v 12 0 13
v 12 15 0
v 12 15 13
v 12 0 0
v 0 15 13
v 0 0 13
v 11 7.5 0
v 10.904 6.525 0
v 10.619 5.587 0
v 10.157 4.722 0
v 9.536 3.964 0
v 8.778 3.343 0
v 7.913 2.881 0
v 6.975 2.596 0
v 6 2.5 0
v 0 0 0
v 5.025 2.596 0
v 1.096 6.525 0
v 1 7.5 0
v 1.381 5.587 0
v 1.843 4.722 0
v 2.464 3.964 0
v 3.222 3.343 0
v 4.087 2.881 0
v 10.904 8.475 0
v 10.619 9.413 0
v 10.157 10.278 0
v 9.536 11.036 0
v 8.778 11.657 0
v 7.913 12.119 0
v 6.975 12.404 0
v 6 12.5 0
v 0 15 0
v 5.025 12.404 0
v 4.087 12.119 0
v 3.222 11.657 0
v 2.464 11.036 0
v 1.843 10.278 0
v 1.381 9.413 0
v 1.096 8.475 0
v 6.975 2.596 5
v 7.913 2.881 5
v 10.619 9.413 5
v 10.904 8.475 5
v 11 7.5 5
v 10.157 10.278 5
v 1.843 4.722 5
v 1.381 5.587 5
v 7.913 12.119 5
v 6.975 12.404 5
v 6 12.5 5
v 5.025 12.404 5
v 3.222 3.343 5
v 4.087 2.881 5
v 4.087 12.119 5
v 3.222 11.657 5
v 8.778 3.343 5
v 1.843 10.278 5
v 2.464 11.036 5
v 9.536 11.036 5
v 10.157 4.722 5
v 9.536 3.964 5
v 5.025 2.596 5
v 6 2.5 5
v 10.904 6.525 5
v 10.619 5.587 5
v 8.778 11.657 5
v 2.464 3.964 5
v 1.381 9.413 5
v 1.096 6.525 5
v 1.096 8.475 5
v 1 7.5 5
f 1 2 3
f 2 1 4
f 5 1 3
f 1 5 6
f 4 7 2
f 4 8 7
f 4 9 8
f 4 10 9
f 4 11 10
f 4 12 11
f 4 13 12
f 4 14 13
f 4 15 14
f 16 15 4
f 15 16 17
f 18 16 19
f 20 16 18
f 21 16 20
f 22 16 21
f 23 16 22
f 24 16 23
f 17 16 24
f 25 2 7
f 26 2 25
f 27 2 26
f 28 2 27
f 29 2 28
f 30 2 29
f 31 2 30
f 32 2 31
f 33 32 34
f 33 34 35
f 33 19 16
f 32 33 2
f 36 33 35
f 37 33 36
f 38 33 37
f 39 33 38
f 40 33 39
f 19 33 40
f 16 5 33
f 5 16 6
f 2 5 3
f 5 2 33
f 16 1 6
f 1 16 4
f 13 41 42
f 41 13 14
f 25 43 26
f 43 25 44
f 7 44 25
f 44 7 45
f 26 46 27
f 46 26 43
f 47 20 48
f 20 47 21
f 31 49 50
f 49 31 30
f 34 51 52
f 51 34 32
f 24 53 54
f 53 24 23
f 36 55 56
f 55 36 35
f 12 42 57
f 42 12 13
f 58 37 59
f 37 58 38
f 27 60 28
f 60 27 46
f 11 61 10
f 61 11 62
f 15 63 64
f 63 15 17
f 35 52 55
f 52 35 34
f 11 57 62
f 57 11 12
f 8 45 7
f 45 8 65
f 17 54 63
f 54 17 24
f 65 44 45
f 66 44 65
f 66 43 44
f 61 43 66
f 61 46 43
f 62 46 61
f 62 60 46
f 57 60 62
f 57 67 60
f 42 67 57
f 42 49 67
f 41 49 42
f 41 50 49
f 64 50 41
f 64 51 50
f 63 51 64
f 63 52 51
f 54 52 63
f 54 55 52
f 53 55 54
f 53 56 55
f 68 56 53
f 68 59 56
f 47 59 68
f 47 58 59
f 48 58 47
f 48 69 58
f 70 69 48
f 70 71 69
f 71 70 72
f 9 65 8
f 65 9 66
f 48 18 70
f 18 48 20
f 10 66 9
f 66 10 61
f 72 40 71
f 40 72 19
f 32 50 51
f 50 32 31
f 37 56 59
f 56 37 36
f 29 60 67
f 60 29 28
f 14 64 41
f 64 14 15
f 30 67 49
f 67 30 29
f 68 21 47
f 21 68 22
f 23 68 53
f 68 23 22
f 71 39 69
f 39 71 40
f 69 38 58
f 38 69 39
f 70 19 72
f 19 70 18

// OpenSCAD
$fn=32;
difference() {
  cube([12,15,13]);
  translate([6,7.5,-0.1]) cylinder(r=5,h=5.1);
}
